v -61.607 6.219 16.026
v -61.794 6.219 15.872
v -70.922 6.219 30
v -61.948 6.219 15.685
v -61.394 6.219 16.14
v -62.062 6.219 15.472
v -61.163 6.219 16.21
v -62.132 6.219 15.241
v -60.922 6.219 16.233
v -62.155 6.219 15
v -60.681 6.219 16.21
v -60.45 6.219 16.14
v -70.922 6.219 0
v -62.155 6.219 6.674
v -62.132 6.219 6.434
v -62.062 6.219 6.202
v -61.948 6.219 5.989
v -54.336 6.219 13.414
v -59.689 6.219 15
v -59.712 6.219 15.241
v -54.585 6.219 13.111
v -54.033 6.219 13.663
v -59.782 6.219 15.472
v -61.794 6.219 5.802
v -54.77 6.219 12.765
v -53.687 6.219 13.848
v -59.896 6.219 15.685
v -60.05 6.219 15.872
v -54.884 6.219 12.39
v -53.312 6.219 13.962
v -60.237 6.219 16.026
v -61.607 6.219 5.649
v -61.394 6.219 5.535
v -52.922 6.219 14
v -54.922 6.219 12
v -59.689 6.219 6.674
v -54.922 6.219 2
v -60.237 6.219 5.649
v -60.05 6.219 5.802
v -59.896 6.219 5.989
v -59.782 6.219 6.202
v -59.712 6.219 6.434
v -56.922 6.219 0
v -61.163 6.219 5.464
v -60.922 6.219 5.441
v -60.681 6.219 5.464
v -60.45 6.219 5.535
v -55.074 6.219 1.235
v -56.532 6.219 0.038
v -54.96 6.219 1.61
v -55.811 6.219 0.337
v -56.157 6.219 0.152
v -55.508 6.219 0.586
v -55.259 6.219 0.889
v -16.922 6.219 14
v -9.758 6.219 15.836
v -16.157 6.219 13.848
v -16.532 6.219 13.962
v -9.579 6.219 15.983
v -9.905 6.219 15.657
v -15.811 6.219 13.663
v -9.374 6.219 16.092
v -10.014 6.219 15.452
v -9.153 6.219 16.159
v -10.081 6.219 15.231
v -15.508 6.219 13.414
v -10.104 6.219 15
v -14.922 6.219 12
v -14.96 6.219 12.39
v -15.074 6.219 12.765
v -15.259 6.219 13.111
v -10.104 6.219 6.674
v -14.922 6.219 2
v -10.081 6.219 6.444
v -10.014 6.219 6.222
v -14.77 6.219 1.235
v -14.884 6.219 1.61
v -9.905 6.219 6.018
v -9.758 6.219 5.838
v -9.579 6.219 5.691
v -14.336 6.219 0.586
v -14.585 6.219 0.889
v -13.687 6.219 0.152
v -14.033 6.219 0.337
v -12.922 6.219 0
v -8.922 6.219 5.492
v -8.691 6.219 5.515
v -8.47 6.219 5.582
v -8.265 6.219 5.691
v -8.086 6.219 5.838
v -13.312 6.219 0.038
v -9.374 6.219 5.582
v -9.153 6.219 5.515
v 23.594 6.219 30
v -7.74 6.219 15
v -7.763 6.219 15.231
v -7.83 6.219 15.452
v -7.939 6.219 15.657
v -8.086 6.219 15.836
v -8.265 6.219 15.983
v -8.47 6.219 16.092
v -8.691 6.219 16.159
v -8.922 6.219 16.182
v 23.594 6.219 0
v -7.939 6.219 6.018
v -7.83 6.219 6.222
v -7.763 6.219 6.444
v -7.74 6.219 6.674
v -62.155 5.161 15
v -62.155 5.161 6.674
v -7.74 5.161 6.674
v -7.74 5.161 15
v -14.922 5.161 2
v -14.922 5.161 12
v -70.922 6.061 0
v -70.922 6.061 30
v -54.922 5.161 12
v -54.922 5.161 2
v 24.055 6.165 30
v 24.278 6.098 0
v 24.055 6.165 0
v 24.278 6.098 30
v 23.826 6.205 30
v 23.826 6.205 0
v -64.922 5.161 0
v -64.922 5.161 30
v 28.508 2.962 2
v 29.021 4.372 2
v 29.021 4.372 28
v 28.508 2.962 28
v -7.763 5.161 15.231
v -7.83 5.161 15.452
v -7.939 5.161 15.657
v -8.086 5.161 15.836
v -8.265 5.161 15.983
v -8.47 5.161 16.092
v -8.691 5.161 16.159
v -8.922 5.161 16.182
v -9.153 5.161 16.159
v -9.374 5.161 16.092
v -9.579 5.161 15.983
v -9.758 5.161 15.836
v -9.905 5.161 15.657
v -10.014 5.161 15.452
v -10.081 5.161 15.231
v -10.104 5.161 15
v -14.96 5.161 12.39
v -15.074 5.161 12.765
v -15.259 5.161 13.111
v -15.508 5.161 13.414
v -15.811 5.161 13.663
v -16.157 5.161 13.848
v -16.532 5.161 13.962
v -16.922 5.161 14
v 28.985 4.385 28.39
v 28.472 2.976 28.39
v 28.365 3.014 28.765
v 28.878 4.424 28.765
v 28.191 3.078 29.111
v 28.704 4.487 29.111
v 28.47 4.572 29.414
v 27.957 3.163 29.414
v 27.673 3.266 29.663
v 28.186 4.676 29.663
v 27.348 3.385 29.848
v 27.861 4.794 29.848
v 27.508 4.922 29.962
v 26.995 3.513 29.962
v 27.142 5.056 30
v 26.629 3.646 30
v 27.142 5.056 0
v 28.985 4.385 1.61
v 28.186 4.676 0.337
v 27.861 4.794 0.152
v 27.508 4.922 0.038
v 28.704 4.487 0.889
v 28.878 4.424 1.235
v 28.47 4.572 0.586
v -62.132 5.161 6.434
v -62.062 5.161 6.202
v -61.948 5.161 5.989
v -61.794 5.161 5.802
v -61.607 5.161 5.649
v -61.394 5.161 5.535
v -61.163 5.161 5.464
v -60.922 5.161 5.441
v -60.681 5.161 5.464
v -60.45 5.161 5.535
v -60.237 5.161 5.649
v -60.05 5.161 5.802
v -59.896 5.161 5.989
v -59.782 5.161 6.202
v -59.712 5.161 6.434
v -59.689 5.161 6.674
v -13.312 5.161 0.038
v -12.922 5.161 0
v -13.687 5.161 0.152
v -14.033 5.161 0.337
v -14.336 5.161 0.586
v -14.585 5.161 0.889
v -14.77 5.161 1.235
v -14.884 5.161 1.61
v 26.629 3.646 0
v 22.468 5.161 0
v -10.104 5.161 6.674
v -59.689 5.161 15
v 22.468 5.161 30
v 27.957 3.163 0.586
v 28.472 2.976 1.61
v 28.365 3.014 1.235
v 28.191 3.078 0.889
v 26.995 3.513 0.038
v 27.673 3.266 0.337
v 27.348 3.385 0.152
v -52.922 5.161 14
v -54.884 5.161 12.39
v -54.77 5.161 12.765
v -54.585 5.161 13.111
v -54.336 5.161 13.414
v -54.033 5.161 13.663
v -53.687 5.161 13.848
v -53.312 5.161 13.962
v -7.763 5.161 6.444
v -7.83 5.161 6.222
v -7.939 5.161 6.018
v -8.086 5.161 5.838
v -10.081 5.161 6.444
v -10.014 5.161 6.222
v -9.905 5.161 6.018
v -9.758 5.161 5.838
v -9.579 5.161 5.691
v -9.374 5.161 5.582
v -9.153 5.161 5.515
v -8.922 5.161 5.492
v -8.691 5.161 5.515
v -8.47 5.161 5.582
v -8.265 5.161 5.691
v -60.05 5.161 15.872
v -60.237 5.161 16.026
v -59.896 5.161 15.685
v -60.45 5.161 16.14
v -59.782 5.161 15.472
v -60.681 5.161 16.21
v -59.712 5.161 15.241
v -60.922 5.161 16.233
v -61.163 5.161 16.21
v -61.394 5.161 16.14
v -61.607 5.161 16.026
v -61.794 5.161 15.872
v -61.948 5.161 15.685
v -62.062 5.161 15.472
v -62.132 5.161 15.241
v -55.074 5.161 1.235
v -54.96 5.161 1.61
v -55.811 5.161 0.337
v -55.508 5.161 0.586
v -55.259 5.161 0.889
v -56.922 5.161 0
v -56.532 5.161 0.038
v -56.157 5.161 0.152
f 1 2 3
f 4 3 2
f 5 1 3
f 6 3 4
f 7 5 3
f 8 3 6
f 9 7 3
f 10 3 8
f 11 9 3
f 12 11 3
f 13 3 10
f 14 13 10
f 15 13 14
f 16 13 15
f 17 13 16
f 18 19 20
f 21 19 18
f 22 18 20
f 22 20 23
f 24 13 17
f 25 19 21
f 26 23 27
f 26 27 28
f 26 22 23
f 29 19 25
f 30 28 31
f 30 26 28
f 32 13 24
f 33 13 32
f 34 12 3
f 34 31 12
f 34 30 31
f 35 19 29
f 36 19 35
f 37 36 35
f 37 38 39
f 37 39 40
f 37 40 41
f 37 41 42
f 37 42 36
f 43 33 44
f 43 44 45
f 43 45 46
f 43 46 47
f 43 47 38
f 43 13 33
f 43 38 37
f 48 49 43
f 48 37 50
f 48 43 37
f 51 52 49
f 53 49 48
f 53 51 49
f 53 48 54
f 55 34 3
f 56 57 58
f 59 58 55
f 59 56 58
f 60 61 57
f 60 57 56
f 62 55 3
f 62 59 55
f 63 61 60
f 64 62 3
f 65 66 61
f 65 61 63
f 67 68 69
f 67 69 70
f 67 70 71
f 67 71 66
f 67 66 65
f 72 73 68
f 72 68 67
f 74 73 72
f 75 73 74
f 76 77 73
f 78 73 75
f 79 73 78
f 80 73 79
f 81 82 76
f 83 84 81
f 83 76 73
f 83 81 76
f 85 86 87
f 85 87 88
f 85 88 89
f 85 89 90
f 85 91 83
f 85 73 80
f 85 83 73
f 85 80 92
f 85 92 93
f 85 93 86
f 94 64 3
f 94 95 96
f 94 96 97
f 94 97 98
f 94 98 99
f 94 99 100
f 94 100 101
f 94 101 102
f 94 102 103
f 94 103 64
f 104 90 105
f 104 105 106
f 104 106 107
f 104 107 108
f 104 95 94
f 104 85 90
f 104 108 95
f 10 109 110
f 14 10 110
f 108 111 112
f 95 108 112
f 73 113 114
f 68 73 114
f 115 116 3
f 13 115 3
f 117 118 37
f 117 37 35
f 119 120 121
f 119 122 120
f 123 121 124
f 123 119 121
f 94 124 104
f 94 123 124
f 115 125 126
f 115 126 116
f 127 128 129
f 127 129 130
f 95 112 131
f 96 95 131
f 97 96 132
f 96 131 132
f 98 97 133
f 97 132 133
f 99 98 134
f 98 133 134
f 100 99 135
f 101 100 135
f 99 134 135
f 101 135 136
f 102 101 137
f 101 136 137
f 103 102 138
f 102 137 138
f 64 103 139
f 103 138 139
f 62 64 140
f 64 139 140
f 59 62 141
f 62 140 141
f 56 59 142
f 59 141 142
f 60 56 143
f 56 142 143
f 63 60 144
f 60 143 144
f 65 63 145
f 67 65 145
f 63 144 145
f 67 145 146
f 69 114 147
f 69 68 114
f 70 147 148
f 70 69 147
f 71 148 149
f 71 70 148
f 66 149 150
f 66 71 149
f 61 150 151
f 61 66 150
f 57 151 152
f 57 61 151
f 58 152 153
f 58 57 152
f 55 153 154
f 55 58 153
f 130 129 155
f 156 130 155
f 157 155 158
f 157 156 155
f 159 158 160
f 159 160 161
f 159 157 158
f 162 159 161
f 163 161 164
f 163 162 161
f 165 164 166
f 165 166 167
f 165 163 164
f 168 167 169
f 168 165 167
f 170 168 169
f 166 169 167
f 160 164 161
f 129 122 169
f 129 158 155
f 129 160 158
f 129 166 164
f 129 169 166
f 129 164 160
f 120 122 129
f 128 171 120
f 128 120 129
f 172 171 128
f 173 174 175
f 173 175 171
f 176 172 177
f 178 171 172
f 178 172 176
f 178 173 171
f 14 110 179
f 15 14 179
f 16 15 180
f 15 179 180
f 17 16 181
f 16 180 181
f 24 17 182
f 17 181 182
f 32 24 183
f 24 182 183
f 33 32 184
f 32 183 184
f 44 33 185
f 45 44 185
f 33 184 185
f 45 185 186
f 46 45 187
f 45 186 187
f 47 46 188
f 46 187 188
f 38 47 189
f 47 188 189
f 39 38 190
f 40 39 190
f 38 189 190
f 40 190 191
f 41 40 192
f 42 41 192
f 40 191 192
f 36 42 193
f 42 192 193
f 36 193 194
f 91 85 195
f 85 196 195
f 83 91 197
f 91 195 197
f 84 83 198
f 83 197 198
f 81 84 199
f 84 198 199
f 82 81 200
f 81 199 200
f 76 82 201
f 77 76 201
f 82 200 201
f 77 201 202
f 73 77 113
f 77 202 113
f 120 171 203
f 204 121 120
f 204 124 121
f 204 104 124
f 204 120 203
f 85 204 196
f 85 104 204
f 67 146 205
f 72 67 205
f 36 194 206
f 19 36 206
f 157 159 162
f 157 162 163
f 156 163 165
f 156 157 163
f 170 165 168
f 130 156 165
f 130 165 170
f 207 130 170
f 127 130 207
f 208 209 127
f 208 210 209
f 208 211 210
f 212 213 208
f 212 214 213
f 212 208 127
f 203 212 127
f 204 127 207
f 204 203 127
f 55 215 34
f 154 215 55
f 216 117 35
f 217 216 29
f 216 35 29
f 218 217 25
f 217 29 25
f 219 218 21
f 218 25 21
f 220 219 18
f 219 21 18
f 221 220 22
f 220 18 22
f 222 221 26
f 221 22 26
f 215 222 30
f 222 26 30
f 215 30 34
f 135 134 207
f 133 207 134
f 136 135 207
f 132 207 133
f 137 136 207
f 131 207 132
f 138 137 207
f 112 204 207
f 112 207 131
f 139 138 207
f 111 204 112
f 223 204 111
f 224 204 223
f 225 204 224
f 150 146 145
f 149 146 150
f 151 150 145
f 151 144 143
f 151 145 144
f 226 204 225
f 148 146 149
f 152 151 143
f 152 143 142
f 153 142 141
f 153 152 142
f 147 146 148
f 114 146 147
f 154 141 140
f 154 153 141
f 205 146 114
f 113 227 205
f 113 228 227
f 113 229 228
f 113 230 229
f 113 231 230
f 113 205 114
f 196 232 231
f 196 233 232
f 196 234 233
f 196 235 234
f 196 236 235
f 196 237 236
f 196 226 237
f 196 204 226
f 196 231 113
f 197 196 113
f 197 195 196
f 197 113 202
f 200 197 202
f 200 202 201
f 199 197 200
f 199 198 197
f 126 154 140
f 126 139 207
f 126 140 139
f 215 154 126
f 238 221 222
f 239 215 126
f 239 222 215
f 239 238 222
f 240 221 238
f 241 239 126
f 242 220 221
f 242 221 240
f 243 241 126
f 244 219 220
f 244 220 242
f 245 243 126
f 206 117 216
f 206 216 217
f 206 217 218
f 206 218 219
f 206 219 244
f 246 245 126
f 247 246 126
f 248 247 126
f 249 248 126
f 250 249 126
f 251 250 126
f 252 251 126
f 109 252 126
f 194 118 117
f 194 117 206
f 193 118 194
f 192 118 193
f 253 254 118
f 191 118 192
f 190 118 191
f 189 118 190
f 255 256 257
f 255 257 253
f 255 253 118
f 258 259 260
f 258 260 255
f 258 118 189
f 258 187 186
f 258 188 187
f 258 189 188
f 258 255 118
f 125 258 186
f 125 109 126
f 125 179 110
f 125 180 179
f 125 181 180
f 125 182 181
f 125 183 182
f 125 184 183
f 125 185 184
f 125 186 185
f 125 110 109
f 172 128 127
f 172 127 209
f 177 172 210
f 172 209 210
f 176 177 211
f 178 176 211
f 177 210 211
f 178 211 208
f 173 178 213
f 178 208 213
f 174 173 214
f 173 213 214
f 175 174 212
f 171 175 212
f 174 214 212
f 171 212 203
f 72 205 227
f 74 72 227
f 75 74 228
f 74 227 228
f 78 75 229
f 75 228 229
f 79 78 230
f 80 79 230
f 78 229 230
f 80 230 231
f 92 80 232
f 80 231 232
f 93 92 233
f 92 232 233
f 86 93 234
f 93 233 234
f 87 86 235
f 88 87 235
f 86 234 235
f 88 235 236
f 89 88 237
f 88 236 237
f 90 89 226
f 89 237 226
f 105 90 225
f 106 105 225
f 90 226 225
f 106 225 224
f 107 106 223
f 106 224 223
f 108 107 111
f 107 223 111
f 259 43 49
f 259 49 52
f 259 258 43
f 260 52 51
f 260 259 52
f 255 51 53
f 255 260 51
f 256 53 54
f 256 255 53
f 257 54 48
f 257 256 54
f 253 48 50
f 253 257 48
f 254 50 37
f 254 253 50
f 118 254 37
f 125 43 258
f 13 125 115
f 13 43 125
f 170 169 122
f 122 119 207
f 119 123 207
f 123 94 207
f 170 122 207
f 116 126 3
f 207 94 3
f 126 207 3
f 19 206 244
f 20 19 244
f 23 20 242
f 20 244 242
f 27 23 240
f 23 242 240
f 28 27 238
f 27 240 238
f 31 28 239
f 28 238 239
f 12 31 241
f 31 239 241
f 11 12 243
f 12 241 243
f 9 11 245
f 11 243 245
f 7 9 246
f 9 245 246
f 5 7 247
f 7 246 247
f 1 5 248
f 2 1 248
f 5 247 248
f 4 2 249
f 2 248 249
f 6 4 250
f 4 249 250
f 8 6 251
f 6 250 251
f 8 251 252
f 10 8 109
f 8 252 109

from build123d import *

# Parameters (mm, degrees)
BOSS_EXTRUDE1_DEPTH = 30
FILLET10_R          = 2
FILLET11_R          = 2
SKETCH4_W           = 40
SKETCH4_H           = 16.42245212
CUT_EXTRUDE1_DEPTH  = 30
FILLET12_R          = 2


with BuildPart() as part:
    # Sketch2 → Boss-Extrude1 (new body)
    with BuildSketch(Plane.XY):
        Polygon((-70.922010647, 6.21881141), (23.946585559, 6.21881141), (29.020925711, 4.371902636), (28.507895496, 2.962363705), (22.467605346, 5.160849526), (-64.922010647, 5.160849526), (-70.922010647, 6.060990271), align=None)
    extrude(amount=BOSS_EXTRUDE1_DEPTH)

    # Fillet10
    fillet10_edges = [part.edges().sort_by_distance(p)[0] for p in [
        (28.764410604, 3.667133171, 30),
        (28.764410604, 3.667133171, 0),
    ]]
    fillet(fillet10_edges, radius=FILLET10_R)

    # Fillet11
    fillet11_edges = [part.edges().sort_by_distance(p)[0] for p in [
        (23.946585559, 6.21881141, 15),
    ]]
    fillet(fillet11_edges, radius=FILLET11_R)

    # Sketch4 → Cut-Extrude1 (cut)
    with BuildSketch(Plane.XZ.offset(-5.160849526)):
        with Locations((-34.922010647, 5.78877394)):
            Rectangle(SKETCH4_W, SKETCH4_H)
        with BuildLine():
            Line((-59.68856271, 6.67422642), (-59.68856271, 15))
            ThreePointArc((-59.68856271, 15), (-60.922010647, 16.233447938), (-62.155458585, 15))
            Line((-62.155458585, 15), (-62.155458585, 6.67422642))
            ThreePointArc((-62.155458585, 6.67422642), (-60.922010647, 5.440778483), (-59.68856271, 6.67422642))
        make_face()
        with BuildLine():
            Line((-7.739956374, 6.67422642), (-7.739956374, 15))
            ThreePointArc((-7.739956374, 15), (-8.922010647, 16.182054274), (-10.104064921, 15))
            Line((-10.104064921, 15), (-10.104064921, 6.67422642))
            ThreePointArc((-10.104064921, 6.67422642), (-8.922010647, 5.492172147), (-7.739956374, 6.67422642))
        make_face()
    extrude(amount=-CUT_EXTRUDE1_DEPTH, mode=Mode.SUBTRACT)

    # Fillet12
    fillet12_edges = [part.edges().sort_by_distance(p)[0] for p in [
        (-54.922010647, 5.689830468, 0),
        (-14.922010647, 5.689830468, 0),
        (-54.922010647, 5.689830468, 14),
        (-14.922010647, 5.689830468, 14),
    ]]
    fillet(fillet12_edges, radius=FILLET12_R)


solid = part.part
